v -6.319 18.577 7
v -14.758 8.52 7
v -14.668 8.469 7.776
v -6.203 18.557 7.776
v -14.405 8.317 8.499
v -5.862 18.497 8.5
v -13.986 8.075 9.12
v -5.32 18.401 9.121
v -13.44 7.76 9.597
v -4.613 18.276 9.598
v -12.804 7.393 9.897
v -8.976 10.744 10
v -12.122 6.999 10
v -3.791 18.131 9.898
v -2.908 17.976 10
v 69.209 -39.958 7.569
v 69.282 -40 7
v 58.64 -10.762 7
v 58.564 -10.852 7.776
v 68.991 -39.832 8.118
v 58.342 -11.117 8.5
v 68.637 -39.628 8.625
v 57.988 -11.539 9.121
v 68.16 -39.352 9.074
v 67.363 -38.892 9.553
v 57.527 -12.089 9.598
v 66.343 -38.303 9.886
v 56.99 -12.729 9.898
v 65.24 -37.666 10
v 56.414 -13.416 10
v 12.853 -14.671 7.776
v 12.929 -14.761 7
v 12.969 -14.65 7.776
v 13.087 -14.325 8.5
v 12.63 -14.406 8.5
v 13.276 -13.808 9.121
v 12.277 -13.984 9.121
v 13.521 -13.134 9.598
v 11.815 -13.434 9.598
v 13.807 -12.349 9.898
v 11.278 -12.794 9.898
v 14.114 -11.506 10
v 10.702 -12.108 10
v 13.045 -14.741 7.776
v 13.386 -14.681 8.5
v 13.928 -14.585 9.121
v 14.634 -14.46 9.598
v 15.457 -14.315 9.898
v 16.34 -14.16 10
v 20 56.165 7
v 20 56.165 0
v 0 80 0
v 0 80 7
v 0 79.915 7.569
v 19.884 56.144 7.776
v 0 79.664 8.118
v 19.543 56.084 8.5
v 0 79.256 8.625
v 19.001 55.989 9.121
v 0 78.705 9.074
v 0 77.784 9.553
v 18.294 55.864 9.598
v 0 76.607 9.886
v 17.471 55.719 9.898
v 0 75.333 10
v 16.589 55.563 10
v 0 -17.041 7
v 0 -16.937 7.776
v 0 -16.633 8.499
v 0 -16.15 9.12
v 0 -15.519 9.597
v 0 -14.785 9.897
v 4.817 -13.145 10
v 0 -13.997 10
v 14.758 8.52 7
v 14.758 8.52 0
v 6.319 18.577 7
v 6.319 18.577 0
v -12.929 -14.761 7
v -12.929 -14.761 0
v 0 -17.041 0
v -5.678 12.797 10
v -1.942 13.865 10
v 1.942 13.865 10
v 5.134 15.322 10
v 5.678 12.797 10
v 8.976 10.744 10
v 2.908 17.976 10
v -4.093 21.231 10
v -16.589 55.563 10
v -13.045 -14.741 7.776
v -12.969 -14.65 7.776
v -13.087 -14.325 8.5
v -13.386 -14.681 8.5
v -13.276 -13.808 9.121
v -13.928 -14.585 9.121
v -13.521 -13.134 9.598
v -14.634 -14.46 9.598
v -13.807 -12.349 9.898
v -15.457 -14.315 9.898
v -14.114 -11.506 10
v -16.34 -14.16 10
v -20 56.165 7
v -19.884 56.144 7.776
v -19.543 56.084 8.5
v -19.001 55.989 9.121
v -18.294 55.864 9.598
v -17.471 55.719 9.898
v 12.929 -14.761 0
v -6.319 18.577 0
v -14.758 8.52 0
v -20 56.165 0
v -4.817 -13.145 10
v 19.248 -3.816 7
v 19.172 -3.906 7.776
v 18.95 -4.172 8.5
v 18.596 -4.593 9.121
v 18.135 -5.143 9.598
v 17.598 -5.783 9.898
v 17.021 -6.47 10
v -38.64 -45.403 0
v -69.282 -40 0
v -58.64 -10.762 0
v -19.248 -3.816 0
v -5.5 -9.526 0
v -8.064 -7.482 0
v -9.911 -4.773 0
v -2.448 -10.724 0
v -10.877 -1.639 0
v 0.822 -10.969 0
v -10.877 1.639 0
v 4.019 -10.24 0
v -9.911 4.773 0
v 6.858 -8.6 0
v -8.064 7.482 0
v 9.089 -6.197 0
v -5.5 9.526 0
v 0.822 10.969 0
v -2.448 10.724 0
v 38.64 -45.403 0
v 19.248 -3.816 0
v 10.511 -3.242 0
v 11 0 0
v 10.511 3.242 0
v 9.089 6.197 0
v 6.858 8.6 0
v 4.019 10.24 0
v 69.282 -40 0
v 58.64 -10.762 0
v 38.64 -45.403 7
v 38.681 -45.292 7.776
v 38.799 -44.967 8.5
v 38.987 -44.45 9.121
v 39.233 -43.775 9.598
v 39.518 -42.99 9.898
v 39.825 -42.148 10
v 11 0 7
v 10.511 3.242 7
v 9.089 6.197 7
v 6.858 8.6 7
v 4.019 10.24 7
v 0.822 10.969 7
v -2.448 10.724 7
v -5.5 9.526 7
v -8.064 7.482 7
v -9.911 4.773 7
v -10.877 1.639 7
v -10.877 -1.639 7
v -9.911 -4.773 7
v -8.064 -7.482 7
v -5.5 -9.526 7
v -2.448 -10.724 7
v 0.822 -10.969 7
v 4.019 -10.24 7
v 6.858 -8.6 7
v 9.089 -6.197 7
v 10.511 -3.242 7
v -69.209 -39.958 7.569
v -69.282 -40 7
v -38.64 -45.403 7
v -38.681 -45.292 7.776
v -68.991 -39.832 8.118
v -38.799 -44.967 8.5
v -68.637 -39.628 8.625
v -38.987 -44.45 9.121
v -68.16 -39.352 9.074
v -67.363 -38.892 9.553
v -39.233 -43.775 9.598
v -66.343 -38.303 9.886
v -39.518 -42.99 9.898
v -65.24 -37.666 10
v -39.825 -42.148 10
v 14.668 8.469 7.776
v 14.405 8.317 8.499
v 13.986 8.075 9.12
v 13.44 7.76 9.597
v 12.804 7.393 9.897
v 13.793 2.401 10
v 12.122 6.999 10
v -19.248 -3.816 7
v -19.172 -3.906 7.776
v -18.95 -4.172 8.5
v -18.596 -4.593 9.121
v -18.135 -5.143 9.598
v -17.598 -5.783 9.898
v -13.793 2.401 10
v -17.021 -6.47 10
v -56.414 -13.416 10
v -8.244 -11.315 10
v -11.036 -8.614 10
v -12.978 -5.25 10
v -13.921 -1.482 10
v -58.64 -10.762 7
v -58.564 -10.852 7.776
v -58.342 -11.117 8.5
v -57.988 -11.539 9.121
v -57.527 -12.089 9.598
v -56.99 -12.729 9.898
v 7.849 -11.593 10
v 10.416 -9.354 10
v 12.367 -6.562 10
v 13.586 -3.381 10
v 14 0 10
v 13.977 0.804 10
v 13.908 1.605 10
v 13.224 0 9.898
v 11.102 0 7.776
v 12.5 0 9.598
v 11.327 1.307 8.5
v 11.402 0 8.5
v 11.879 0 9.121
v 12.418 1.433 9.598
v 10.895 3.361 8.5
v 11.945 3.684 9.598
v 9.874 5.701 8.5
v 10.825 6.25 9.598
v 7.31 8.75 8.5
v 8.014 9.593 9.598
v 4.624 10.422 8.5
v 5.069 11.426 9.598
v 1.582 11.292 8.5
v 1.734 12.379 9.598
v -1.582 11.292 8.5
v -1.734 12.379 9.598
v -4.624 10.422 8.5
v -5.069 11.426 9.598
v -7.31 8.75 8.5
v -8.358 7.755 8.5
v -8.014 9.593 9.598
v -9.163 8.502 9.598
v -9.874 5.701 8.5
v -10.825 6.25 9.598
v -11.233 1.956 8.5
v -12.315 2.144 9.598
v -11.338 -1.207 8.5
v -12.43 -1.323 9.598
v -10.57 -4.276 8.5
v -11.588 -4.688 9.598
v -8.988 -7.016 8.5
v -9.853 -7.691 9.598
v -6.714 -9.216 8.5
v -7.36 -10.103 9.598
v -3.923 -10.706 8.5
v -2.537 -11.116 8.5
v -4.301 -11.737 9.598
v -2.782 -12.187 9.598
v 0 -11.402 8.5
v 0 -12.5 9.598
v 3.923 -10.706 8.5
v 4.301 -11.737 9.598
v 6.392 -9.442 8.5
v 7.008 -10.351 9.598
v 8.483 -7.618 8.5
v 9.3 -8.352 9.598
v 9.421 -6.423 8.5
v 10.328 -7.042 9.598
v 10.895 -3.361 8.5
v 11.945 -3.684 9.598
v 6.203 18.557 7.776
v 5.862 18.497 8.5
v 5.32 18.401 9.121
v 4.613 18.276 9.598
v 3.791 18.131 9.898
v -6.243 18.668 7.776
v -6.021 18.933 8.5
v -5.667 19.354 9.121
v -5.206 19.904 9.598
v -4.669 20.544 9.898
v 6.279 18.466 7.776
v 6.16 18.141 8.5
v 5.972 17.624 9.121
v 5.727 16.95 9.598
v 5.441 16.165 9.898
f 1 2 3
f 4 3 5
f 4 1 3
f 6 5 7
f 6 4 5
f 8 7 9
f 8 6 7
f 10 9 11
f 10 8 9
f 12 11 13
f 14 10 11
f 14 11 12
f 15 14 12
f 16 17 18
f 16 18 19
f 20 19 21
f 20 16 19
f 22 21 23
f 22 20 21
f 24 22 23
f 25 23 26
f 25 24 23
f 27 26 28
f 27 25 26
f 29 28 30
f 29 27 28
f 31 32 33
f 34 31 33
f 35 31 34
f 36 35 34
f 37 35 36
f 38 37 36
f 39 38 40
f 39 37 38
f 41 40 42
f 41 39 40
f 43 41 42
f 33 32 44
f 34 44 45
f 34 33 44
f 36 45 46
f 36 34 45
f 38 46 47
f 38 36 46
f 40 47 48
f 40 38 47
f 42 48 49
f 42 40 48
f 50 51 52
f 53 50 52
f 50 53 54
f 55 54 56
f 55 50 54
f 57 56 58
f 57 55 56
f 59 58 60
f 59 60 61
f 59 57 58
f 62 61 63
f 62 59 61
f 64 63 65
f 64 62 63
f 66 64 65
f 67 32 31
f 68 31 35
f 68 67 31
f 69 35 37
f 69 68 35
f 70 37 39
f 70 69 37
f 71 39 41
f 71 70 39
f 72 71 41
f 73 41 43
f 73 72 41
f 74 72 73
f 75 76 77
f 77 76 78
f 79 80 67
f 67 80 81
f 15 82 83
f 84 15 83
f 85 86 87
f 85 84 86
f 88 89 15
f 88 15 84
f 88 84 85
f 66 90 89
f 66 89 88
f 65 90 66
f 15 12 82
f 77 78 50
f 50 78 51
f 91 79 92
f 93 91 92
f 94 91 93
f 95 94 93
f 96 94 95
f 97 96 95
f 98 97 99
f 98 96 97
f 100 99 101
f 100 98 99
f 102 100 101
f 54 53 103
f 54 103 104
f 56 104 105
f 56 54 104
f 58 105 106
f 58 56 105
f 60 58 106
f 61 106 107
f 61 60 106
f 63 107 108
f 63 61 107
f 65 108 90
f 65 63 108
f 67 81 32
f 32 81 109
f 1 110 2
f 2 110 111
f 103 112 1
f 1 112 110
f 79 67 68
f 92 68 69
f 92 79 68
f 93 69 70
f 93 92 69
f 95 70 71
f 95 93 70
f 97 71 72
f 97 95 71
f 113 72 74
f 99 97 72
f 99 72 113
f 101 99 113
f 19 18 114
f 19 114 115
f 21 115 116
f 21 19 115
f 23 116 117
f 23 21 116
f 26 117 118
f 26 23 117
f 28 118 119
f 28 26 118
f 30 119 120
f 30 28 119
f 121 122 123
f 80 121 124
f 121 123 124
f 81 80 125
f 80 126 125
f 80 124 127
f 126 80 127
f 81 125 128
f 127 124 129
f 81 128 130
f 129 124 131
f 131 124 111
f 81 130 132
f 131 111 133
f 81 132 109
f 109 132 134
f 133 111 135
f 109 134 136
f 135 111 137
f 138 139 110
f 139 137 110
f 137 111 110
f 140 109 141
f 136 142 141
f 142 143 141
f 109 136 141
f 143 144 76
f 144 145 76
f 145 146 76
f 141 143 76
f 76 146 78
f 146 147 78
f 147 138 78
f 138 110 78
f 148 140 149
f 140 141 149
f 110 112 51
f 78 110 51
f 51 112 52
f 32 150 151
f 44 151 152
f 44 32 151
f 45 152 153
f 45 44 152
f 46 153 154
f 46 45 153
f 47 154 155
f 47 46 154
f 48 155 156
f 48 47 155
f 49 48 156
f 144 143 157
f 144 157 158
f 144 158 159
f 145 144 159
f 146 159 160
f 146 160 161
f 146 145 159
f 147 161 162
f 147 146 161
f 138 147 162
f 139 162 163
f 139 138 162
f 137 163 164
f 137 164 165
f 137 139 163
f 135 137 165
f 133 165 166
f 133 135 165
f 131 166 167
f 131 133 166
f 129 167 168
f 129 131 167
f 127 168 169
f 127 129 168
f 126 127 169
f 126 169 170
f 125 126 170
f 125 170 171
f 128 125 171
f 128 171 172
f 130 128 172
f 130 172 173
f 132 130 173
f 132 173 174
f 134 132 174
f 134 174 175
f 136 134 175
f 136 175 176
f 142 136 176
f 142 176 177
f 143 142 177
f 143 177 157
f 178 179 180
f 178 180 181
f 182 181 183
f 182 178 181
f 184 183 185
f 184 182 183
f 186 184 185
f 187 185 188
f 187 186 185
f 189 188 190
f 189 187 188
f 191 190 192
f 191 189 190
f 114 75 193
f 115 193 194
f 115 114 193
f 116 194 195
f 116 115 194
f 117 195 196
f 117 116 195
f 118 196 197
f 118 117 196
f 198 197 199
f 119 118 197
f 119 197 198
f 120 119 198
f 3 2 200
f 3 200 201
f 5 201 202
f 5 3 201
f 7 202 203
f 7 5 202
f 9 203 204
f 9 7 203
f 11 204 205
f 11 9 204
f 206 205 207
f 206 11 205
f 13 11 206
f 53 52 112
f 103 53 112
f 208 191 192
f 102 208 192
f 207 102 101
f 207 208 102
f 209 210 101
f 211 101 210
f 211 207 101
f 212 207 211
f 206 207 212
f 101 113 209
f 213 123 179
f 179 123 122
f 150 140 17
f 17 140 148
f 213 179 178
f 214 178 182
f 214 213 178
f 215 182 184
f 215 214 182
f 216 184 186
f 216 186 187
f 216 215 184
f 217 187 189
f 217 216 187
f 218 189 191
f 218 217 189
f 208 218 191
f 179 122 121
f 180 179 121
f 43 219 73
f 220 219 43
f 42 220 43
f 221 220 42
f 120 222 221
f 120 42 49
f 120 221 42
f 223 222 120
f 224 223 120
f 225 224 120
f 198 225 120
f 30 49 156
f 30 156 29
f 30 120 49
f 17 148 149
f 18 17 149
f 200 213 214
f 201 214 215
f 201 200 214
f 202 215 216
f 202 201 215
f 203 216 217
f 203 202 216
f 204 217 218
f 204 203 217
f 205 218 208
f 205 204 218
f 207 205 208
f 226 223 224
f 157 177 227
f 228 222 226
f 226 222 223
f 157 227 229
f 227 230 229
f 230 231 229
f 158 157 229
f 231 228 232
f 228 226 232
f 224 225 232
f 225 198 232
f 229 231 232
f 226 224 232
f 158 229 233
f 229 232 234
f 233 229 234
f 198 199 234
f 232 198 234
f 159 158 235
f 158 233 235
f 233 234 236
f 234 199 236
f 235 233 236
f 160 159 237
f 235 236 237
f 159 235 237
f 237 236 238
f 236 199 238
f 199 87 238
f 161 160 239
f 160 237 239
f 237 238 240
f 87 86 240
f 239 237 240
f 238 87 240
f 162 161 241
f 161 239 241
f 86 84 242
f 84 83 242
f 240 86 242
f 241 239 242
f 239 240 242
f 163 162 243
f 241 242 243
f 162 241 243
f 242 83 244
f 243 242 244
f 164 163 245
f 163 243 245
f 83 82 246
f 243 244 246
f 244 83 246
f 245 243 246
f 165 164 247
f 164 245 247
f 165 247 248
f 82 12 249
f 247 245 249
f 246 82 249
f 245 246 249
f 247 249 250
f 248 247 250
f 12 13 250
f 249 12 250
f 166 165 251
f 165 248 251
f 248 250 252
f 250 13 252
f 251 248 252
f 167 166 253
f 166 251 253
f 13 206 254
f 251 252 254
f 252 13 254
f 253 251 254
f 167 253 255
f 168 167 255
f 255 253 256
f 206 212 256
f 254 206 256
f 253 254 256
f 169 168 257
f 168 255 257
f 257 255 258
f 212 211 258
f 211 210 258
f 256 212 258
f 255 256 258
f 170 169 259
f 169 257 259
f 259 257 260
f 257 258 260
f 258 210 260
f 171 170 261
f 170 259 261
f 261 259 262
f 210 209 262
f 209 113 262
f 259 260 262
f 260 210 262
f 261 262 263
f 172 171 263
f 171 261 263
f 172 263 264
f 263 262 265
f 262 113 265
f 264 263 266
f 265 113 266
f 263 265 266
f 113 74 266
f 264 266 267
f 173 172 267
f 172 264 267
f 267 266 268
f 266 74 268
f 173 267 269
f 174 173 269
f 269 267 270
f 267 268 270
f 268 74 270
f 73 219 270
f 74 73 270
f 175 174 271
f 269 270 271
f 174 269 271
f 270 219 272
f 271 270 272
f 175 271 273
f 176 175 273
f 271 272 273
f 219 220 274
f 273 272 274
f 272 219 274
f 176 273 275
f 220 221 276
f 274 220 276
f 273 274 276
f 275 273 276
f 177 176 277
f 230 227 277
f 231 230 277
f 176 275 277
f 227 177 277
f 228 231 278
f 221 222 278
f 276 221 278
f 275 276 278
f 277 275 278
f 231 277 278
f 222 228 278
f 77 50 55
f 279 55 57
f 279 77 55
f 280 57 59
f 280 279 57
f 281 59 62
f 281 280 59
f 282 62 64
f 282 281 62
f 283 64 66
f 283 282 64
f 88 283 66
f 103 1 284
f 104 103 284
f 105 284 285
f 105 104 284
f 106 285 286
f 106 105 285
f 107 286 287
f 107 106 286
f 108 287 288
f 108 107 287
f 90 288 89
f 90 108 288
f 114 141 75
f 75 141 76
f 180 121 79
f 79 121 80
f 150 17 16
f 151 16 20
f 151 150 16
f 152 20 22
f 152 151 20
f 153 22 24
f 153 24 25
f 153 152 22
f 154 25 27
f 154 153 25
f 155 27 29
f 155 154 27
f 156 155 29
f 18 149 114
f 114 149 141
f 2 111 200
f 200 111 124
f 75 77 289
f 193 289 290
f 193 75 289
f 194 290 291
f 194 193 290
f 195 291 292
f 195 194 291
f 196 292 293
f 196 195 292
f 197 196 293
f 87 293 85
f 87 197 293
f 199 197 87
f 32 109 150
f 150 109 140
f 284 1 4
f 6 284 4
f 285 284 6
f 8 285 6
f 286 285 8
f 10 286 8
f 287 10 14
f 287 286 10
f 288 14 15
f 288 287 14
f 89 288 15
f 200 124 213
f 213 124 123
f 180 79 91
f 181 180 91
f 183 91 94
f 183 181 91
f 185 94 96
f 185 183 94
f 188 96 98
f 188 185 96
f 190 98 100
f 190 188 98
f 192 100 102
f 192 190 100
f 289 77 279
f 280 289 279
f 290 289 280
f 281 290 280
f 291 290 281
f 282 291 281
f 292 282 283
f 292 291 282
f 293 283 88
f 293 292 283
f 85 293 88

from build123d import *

# Parameters (mm, degrees)
F0_R          = 11
F1_DEPTH      = 10
F2_T1_DEPTH   = 46.1144765372
F2_T3_DEPTH   = 46.1144765372
F2_T5_DEPTH   = 46.1144765372
F2_T7_DEPTH   = 46.1144765372
F2_T9_DEPTH   = 46.1144765372
F2_T11_DEPTH  = 46.1144765372
F2_T16_DEPTH  = 33.3781970019
F2_T21_DEPTH  = 33.3781970019
F2_T26_DEPTH  = 55
F2_T31_DEPTH  = 55
F2_T36_DEPTH  = 33.3781970019
F2_T41_DEPTH  = 33.3781970019
F2_T46_DEPTH  = 55
F2_T51_DEPTH  = 55
F2_T56_DEPTH  = 33.3781970019
F2_T61_DEPTH  = 33.3781970019
F2_T66_DEPTH  = 55
F2_T71_DEPTH  = 55
F2_T79_DEPTH  = 33.3781970019
F2_T83_DEPTH  = 55
F2_T90_DEPTH  = 33.3781970019
F2_T94_DEPTH  = 55
F2_T101_DEPTH = 55
F2_T105_DEPTH = 33.3781970019
F2_T112_DEPTH = 33.3781970019
F2_T116_DEPTH = 55
F2_T123_DEPTH = 55
F2_T127_DEPTH = 33.3781970019
F2_T134_DEPTH = 33.3781970019
F2_T138_DEPTH = 55


# Not quite as in the source:
# - a fillet or chamfer that OpenCascade refuses, or shapes differently, is made with other operations: its cross-section is extruded or revolved along the edge and cut away or added


with BuildPart() as f1:
    # F0 (on Top) → F1 (new body)
    with BuildSketch(Plane.XY):
        Polygon((20, 56.1649281481), (0, 80), (-20, 56.1649281481), (-6.319194267, 18.5772233167), (-14.7578366373, 8.5204409552), (-19.2479444575, -3.8160288917), (-58.640254578, -10.7619559984), (-69.2820323028, -40), (-38.640254578, -45.4029721497), (-12.9287501905, -14.761194425), (0, -17.0408819104), (12.9287501905, -14.761194425), (38.640254578, -45.4029721497), (69.2820323028, -40), (58.640254578, -10.7619559984), (19.2479444575, -3.8160288917), (14.7578366373, 8.5204409552), (6.319194267, 18.5772233167), align=None)
        Circle(F0_R, mode=Mode.SUBTRACT)
    extrude(amount=F1_DEPTH)

    # F2: fillet of radius 3 on 19 edges, made by hand

    # F2_s2 → F2_t1 (cut)
    with BuildSketch(Plane(origin=(-14.5714030478, 17.3655219314, 0), x_dir=(0, 0, 1), z_dir=(-0.6427876097, 0.7660444431, 0))):
        with BuildLine():
            ThreePointArc((7, 51.4230087749), (9.1213203436, 50.5443291185), (10, 48.4230087749))
            Line((10, 48.4230087749), (10, 51.4230087749))
            Line((10, 51.4230087749), (7, 51.4230087749))
        make_face()
    extrude(amount=F2_T1_DEPTH, mode=Mode.SUBTRACT)

    # F2_s4 → F2_t3 (cut)
    with BuildSketch(Plane(origin=(44.2132171931, 52.6912604301, 0), x_dir=(0, 0, 1), z_dir=(-0.6427876097, -0.7660444431, 0))):
        with BuildLine():
            ThreePointArc((7, 51.4230087749), (9.1213203436, 50.5443291185), (10, 48.4230087749))
            Line((10, 48.4230087749), (10, 51.4230087749))
            Line((10, 51.4230087749), (7, 51.4230087749))
        make_face()
    extrude(amount=F2_T3_DEPTH, mode=Mode.SUBTRACT)

    # F2_s6 → F2_t5 (cut)
    with BuildSketch(Plane(origin=(-7.7532816186, -21.3019661739, 0), x_dir=(0, 0, 1), z_dir=(-0.3420201433, -0.9396926208, 0))):
        with BuildLine():
            ThreePointArc((7, 51.4230087749), (9.1213203436, 50.5443291185), (10, 48.4230087749))
            Line((10, 48.4230087749), (10, 51.4230087749))
            Line((10, 51.4230087749), (7, 51.4230087749))
        make_face()
    extrude(amount=F2_T5_DEPTH, mode=Mode.SUBTRACT)

    # F2_s8 → F2_t7 (cut)
    with BuildSketch(Plane(origin=(-67.7385786864, 11.9441390573, 0), x_dir=(0, 0, 1), z_dir=(0.984807753, -0.1736481777, 0))):
        with BuildLine():
            ThreePointArc((7, 51.4230087749), (9.1213203436, 50.5443291185), (10, 48.4230087749))
            Line((10, 48.4230087749), (10, 51.4230087749))
            Line((10, 51.4230087749), (7, 51.4230087749))
        make_face()
    extrude(amount=F2_T7_DEPTH, mode=Mode.SUBTRACT)

    # F2_s10 → F2_t9 (cut)
    with BuildSketch(Plane(origin=(22.3246846665, 3.9364442425, 0), x_dir=(0, 0, 1), z_dir=(0.984807753, 0.1736481777, 0))):
        with BuildLine():
            ThreePointArc((7, 51.4230087749), (9.1213203436, 50.5443291185), (10, 48.4230087749))
            Line((10, 48.4230087749), (10, 51.4230087749))
            Line((10, 51.4230087749), (7, 51.4230087749))
        make_face()
    extrude(amount=F2_T9_DEPTH, mode=Mode.SUBTRACT)

    # F2_s12 → F2_t11 (cut)
    with BuildSketch(Plane(origin=(23.5253614933, -64.6353994873, 0), x_dir=(0, 0, 1), z_dir=(-0.3420201433, 0.9396926208, 0))):
        with BuildLine():
            ThreePointArc((7, 51.4230087749), (9.1213203436, 50.5443291185), (10, 48.4230087749))
            Line((10, 48.4230087749), (10, 51.4230087749))
            Line((10, 51.4230087749), (7, 51.4230087749))
        make_face()
    extrude(amount=F2_T11_DEPTH, mode=Mode.SUBTRACT)


with BuildPart() as f2_tool14:
    # F2_s15 → F2_t16 (new body)
    with BuildSketch(Plane(origin=(6.043180902, -16.60350307, 0), x_dir=(0, 0, 1), z_dir=(-0.3420201433, 0.9396926208, 0))):
        with BuildLine():
            ThreePointArc((7, 16.7819926235), (9.1213203436, 15.9033129671), (10, 13.7819926235))
            Line((10, 13.7819926235), (10, 16.7819926235))
            Line((10, 16.7819926235), (7, 16.7819926235))
        make_face()
    extrude(amount=F2_T16_DEPTH)

    split(bisect_by=Plane(origin=(-0.0721828315, -0.4093691799, 0), x_dir=(0, 0, 1), z_dir=(0.1736481777, 0.984807753, 0)), keep=Keep.TOP)


with BuildPart() as f1_1:
    add(f1.part)

    # F2_t13: cut F2_tool14
    add(f2_tool14.part, mode=Mode.SUBTRACT)


with BuildPart() as f2_tool19:
    # F2_s20 → F2_t21 (new body)
    with BuildSketch(Plane(origin=(10.0976264671, -12.0338826188, 0), x_dir=(0, 0, 1), z_dir=(-0.6427876097, 0.7660444431, 0))):
        with BuildLine():
            ThreePointArc((7, 16.7819926235), (9.1213203436, 15.9033129671), (10, 13.7819926235))
            Line((10, 13.7819926235), (10, 16.7819926235))
            Line((10, 16.7819926235), (7, 16.7819926235))
        make_face()
    extrude(amount=F2_T21_DEPTH)

    split(bisect_by=Plane(origin=(-0.3906155251, 0.1421724242, 0), x_dir=(0, 0, 1), z_dir=(0.9396926208, -0.3420201433, 0)), keep=Keep.TOP)


with BuildPart() as f1_2:
    add(f1_1.part)

    # F2_t18: cut F2_tool19
    add(f2_tool19.part, mode=Mode.SUBTRACT)


with BuildPart() as f2_tool24:
    # F2_s25 → F2_t26 (new body)
    with BuildSketch(Plane(origin=(4.1446587171, 11.3873562366, 0), x_dir=(0, 0, 1), z_dir=(0.3420201433, 0.9396926208, 0))):
        with BuildLine():
            ThreePointArc((7, -0.4156843594), (9.1213203436, -1.2943640158), (10, -3.4156843594))
            Line((10, -3.4156843594), (10, -0.4156843594))
            Line((10, -0.4156843594), (7, -0.4156843594))
        make_face()
    extrude(amount=F2_T26_DEPTH)

    split(bisect_by=Plane(origin=(12.8557521937, 10.7872569243, 0), x_dir=(0, 0, 1), z_dir=(0.7660444431, 0.6427876097, 0)), keep=Keep.TOP)


with BuildPart() as f1_3:
    add(f1_2.part)

    # F2_t23: cut F2_tool24
    add(f2_tool24.part, mode=Mode.SUBTRACT)


with BuildPart() as f2_tool29:
    # F2_s30 → F2_t31 (new body)
    with BuildSketch(Plane(origin=(-22.9557666, 63.0704503798, 0), x_dir=(0, 0, 1), z_dir=(0.3420201433, -0.9396926208, 0))):
        with BuildLine():
            ThreePointArc((7, -0.4156843594), (9.1213203436, -1.2943640158), (10, -3.4156843594))
            Line((10, -3.4156843594), (10, -0.4156843594))
            Line((10, -0.4156843594), (7, -0.4156843594))
        make_face()
    extrude(amount=F2_T31_DEPTH)

    split(bisect_by=Plane(origin=(-12.8557521937, 10.7872569243, 0), x_dir=(0, 0, 1), z_dir=(-0.7660444431, 0.6427876097, 0)), keep=Keep.TOP)


with BuildPart() as f1_4:
    add(f1_3.part)

    # F2_t28: cut F2_tool29
    add(f2_tool29.part, mode=Mode.SUBTRACT)


with BuildPart() as f2_tool34:
    # F2_s35 → F2_t36 (new body)
    with BuildSketch(Plane(origin=(11.3574649994, 13.5352997158, 0), x_dir=(0, 0, 1), z_dir=(-0.6427876097, -0.7660444431, 0))):
        with BuildLine():
            ThreePointArc((7, 16.7819926235), (9.1213203436, 15.9033129671), (10, 13.7819926235))
            Line((10, 13.7819926235), (10, 16.7819926235))
            Line((10, 16.7819926235), (7, 16.7819926235))
        make_face()
    extrude(amount=F2_T36_DEPTH)

    split(bisect_by=Plane(origin=(0.3906155251, 0.1421724242, 0), x_dir=(0, 0, 1), z_dir=(-0.9396926208, -0.3420201433, 0)), keep=Keep.TOP)


with BuildPart() as f1_5:
    add(f1_4.part)

    # F2_t33: cut F2_tool34
    add(f2_tool34.part, mode=Mode.SUBTRACT)


with BuildPart() as f2_tool39:
    # F2_s40 → F2_t41 (new body)
    with BuildSketch(Plane(origin=(5.3728348205, 14.7617423478, 0), x_dir=(0, 0, 1), z_dir=(-0.3420201433, -0.9396926208, 0))):
        with BuildLine():
            ThreePointArc((7, 16.7819926235), (9.1213203436, 15.9033129671), (10, 13.7819926235))
            Line((10, 13.7819926235), (10, 16.7819926235))
            Line((10, 16.7819926235), (7, 16.7819926235))
        make_face()
    extrude(amount=F2_T41_DEPTH)

    split(bisect_by=Plane(origin=(0.0721828315, -0.4093691799, 0), x_dir=(0, 0, 1), z_dir=(-0.1736481777, 0.984807753, 0)), keep=Keep.TOP)


with BuildPart() as f1_6:
    add(f1_5.part)

    # F2_t38: cut F2_tool39
    add(f2_tool39.part, mode=Mode.SUBTRACT)


with BuildPart() as f2_tool44:
    # F2_s45 → F2_t46 (new body)
    with BuildSketch(Plane(origin=(-11.9340691414, -2.1042983793, 0), x_dir=(0, 0, 1), z_dir=(-0.984807753, -0.1736481777, 0))):
        with BuildLine():
            ThreePointArc((7, -0.4156843594), (9.1213203436, -1.2943640158), (10, -3.4156843594))
            Line((10, -3.4156843594), (10, -0.4156843594))
            Line((10, -0.4156843594), (7, -0.4156843594))
        make_face()
    extrude(amount=F2_T46_DEPTH)

    split(bisect_by=Plane(origin=(-15.7699146304, 5.7397795224, 0), x_dir=(0, 0, 1), z_dir=(-0.9396926208, 0.3420201433, 0)), keep=Keep.TOP)


with BuildPart() as f1_7:
    add(f1_6.part)

    # F2_t43: cut F2_tool44
    add(f2_tool44.part, mode=Mode.SUBTRACT)


with BuildPart() as f2_tool49:
    # F2_s50 → F2_t51 (new body)
    with BuildSketch(Plane(origin=(-43.1427289571, -51.4155022289, 0), x_dir=(0, 0, 1), z_dir=(0.6427876097, 0.7660444431, 0))):
        with BuildLine():
            ThreePointArc((7, -0.4156843594), (9.1213203436, -1.2943640158), (10, -3.4156843594))
            Line((10, -3.4156843594), (10, -0.4156843594))
            Line((10, -0.4156843594), (7, -0.4156843594))
        make_face()
    extrude(amount=F2_T51_DEPTH)

    split(bisect_by=Plane(origin=(-2.9141624367, -16.5270364467, 0), x_dir=(0, 0, 1), z_dir=(-0.1736481777, -0.984807753, 0)), keep=Keep.TOP)


with BuildPart() as f1_8:
    add(f1_7.part)

    # F2_t48: cut F2_tool49
    add(f2_tool49.part, mode=Mode.SUBTRACT)


with BuildPart() as f2_tool54:
    # F2_s55 → F2_t56 (new body)
    with BuildSketch(Plane(origin=(-17.4006459014, 3.0682033542, 0), x_dir=(0, 0, 1), z_dir=(0.984807753, -0.1736481777, 0))):
        with BuildLine():
            ThreePointArc((7, 16.7819926235), (9.1213203436, 15.9033129671), (10, 13.7819926235))
            Line((10, 13.7819926235), (10, 16.7819926235))
            Line((10, 16.7819926235), (7, 16.7819926235))
        make_face()
    extrude(amount=F2_T56_DEPTH)

    split(bisect_by=Plane(origin=(-0.3184326936, 0.2671967557, 0), x_dir=(0, 0, 1), z_dir=(0.7660444431, -0.6427876097, 0)), keep=Keep.TOP)


with BuildPart() as f1_9:
    add(f1_8.part)

    # F2_t53: cut F2_tool54
    add(f2_tool54.part, mode=Mode.SUBTRACT)


with BuildPart() as f2_tool59:
    # F2_s60 → F2_t61 (new body)
    with BuildSketch(Plane(origin=(-15.4704612876, -2.727859729, 0), x_dir=(0, 0, 1), z_dir=(0.984807753, 0.1736481777, 0))):
        with BuildLine():
            ThreePointArc((7, 16.7819926235), (9.1213203436, 15.9033129671), (10, 13.7819926235))
            Line((10, 13.7819926235), (10, 16.7819926235))
            Line((10, 16.7819926235), (7, 16.7819926235))
        make_face()
    extrude(amount=F2_T61_DEPTH)

    split(bisect_by=Plane(origin=(0.3184326936, 0.2671967557, 0), x_dir=(0, 0, 1), z_dir=(-0.7660444431, -0.6427876097, 0)), keep=Keep.TOP)


with BuildPart() as f1_10:
    add(f1_9.part)

    # F2_t58: cut F2_tool59
    add(f2_tool59.part, mode=Mode.SUBTRACT)


with BuildPart() as f2_tool64:
    # F2_s65 → F2_t66 (new body)
    with BuildSketch(Plane(origin=(7.7894104243, -9.2830578573, 0), x_dir=(0, 0, 1), z_dir=(0.6427876097, -0.7660444431, 0))):
        with BuildLine():
            ThreePointArc((7, -0.4156843594), (9.1213203436, -1.2943640158), (10, -3.4156843594))
            Line((10, -3.4156843594), (10, -0.4156843594))
            Line((10, -0.4156843594), (7, -0.4156843594))
        make_face()
    extrude(amount=F2_T66_DEPTH)

    split(bisect_by=Plane(origin=(2.9141624367, -16.5270364467, 0), x_dir=(0, 0, 1), z_dir=(0.1736481777, -0.984807753, 0)), keep=Keep.TOP)


with BuildPart() as f1_11:
    add(f1_10.part)

    # F2_t63: cut F2_tool64
    add(f2_tool64.part, mode=Mode.SUBTRACT)


with BuildPart() as f2_tool69:
    # F2_s70 → F2_t71 (new body)
    with BuildSketch(Plane(origin=(66.0984955571, -11.654948151, 0), x_dir=(0, 0, 1), z_dir=(-0.984807753, 0.1736481777, 0))):
        with BuildLine():
            ThreePointArc((7, -0.4156843594), (9.1213203436, -1.2943640158), (10, -3.4156843594))
            Line((10, -3.4156843594), (10, -0.4156843594))
            Line((10, -0.4156843594), (7, -0.4156843594))
        make_face()
    extrude(amount=F2_T71_DEPTH)

    split(bisect_by=Plane(origin=(15.7699146304, 5.7397795224, 0), x_dir=(0, 0, 1), z_dir=(0.9396926208, 0.3420201433, 0)), keep=Keep.TOP)


with BuildPart() as f1_12:
    add(f1_11.part)

    # F2_t68: cut F2_tool69
    add(f2_tool69.part, mode=Mode.SUBTRACT)

    # F2_s73 → F2_t74 (revolve, cut)
    with BuildSketch(Plane.XZ):
        with BuildLine():
            ThreePointArc((11, 7), (11.8786796564, 9.1213203436), (14, 10))
            Line((14, 10), (11, 10))
            Line((11, 10), (11, 7))
        make_face()
    revolve(axis=Axis((0, 0, 10), (0, 0, 1)), mode=Mode.SUBTRACT)


with BuildPart() as f2_tool77:
    # F2_s78 → F2_t79 (new body)
    with BuildSketch(Plane(origin=(6.043180902, -16.60350307, 0), x_dir=(0, 0, 1), z_dir=(-0.3420201433, 0.9396926208, 0))):
        with BuildLine():
            ThreePointArc((7, 16.7819926235), (9.1213203436, 15.9033129671), (10, 13.7819926235))
            Line((10, 13.7819926235), (10, 16.7819926235))
            Line((10, 16.7819926235), (7, 16.7819926235))
        make_face()
    extrude(amount=F2_T79_DEPTH)

    split(bisect_by=Plane(origin=(-0.0721828315, -0.4093691799, 0), x_dir=(0, 0, 1), z_dir=(-0.1736481777, -0.984807753, 0)), keep=Keep.TOP)


with BuildPart() as f2_tool81:
    # F2_s82 → F2_t83 (new body)
    with BuildSketch(Plane(origin=(66.0984955571, -11.654948151, 0), x_dir=(0, 0, 1), z_dir=(-0.984807753, 0.1736481777, 0))):
        with BuildLine():
            ThreePointArc((7, -0.4156843594), (9.1213203436, -1.2943640158), (10, -3.4156843594))
            Line((10, -3.4156843594), (10, -0.4156843594))
            Line((10, -0.4156843594), (7, -0.4156843594))
        make_face()
    extrude(amount=F2_T83_DEPTH)

    split(bisect_by=Plane(origin=(15.7699146304, 5.7397795224, 0), x_dir=(0, 0, 1), z_dir=(-0.9396926208, -0.3420201433, 0)), keep=Keep.TOP)


with BuildPart() as f2_tool77_1:
    add(f2_tool77.part)

    # F2_t85: intersect F2_tool81
    add(f2_tool81.part, mode=Mode.INTERSECT)


with BuildPart() as f1_13:
    add(f1_12.part)

    # F2_t75: cut F2_tool77
    add(f2_tool77_1.part, mode=Mode.SUBTRACT)


with BuildPart() as f2_tool88:
    # F2_s89 → F2_t90 (new body)
    with BuildSketch(Plane(origin=(10.0976264671, -12.0338826188, 0), x_dir=(0, 0, 1), z_dir=(-0.6427876097, 0.7660444431, 0))):
        with BuildLine():
            ThreePointArc((7, 16.7819926235), (9.1213203436, 15.9033129671), (10, 13.7819926235))
            Line((10, 13.7819926235), (10, 16.7819926235))
            Line((10, 16.7819926235), (7, 16.7819926235))
        make_face()
    extrude(amount=F2_T90_DEPTH)

    split(bisect_by=Plane(origin=(-0.3906155251, 0.1421724242, 0), x_dir=(0, 0, 1), z_dir=(-0.9396926208, 0.3420201433, 0)), keep=Keep.TOP)


with BuildPart() as f2_tool92:
    # F2_s93 → F2_t94 (new body)
    with BuildSketch(Plane(origin=(4.1446587171, 11.3873562366, 0), x_dir=(0, 0, 1), z_dir=(0.3420201433, 0.9396926208, 0))):
        with BuildLine():
            ThreePointArc((7, -0.4156843594), (9.1213203436, -1.2943640158), (10, -3.4156843594))
            Line((10, -3.4156843594), (10, -0.4156843594))
            Line((10, -0.4156843594), (7, -0.4156843594))
        make_face()
    extrude(amount=F2_T94_DEPTH)

    split(bisect_by=Plane(origin=(12.8557521937, 10.7872569243, 0), x_dir=(0, 0, 1), z_dir=(-0.7660444431, -0.6427876097, 0)), keep=Keep.TOP)


with BuildPart() as f2_tool88_1:
    add(f2_tool88.part)

    # F2_t96: intersect F2_tool92
    add(f2_tool92.part, mode=Mode.INTERSECT)


with BuildPart() as f1_14:
    add(f1_13.part)

    # F2_t86: cut F2_tool88
    add(f2_tool88_1.part, mode=Mode.SUBTRACT)


with BuildPart() as f2_tool99:
    # F2_s100 → F2_t101 (new body)
    with BuildSketch(Plane(origin=(-22.9557666, 63.0704503798, 0), x_dir=(0, 0, 1), z_dir=(0.3420201433, -0.9396926208, 0))):
        with BuildLine():
            ThreePointArc((7, -0.4156843594), (9.1213203436, -1.2943640158), (10, -3.4156843594))
            Line((10, -3.4156843594), (10, -0.4156843594))
            Line((10, -0.4156843594), (7, -0.4156843594))
        make_face()
    extrude(amount=F2_T101_DEPTH)

    split(bisect_by=Plane(origin=(-12.8557521937, 10.7872569243, 0), x_dir=(0, 0, 1), z_dir=(0.7660444431, -0.6427876097, 0)), keep=Keep.TOP)


with BuildPart() as f2_tool103:
    # F2_s104 → F2_t105 (new body)
    with BuildSketch(Plane(origin=(11.3574649994, 13.5352997158, 0), x_dir=(0, 0, 1), z_dir=(-0.6427876097, -0.7660444431, 0))):
        with BuildLine():
            ThreePointArc((7, 16.7819926235), (9.1213203436, 15.9033129671), (10, 13.7819926235))
            Line((10, 13.7819926235), (10, 16.7819926235))
            Line((10, 16.7819926235), (7, 16.7819926235))
        make_face()
    extrude(amount=F2_T105_DEPTH)

    split(bisect_by=Plane(origin=(0.3906155251, 0.1421724242, 0), x_dir=(0, 0, 1), z_dir=(0.9396926208, 0.3420201433, 0)), keep=Keep.TOP)


with BuildPart() as f2_tool99_1:
    add(f2_tool99.part)

    # F2_t107: intersect F2_tool103
    add(f2_tool103.part, mode=Mode.INTERSECT)


with BuildPart() as f1_15:
    add(f1_14.part)

    # F2_t97: cut F2_tool99
    add(f2_tool99_1.part, mode=Mode.SUBTRACT)


with BuildPart() as f2_tool110:
    # F2_s111 → F2_t112 (new body)
    with BuildSketch(Plane(origin=(5.3728348205, 14.7617423478, 0), x_dir=(0, 0, 1), z_dir=(-0.3420201433, -0.9396926208, 0))):
        with BuildLine():
            ThreePointArc((7, 16.7819926235), (9.1213203436, 15.9033129671), (10, 13.7819926235))
            Line((10, 13.7819926235), (10, 16.7819926235))
            Line((10, 16.7819926235), (7, 16.7819926235))
        make_face()
    extrude(amount=F2_T112_DEPTH)

    split(bisect_by=Plane(origin=(0.0721828315, -0.4093691799, 0), x_dir=(0, 0, 1), z_dir=(0.1736481777, -0.984807753, 0)), keep=Keep.TOP)


with BuildPart() as f2_tool114:
    # F2_s115 → F2_t116 (new body)
    with BuildSketch(Plane(origin=(-11.9340691414, -2.1042983793, 0), x_dir=(0, 0, 1), z_dir=(-0.984807753, -0.1736481777, 0))):
        with BuildLine():
            ThreePointArc((7, -0.4156843594), (9.1213203436, -1.2943640158), (10, -3.4156843594))
            Line((10, -3.4156843594), (10, -0.4156843594))
            Line((10, -0.4156843594), (7, -0.4156843594))
        make_face()
    extrude(amount=F2_T116_DEPTH)

    split(bisect_by=Plane(origin=(-15.7699146304, 5.7397795224, 0), x_dir=(0, 0, 1), z_dir=(0.9396926208, -0.3420201433, 0)), keep=Keep.TOP)


with BuildPart() as f2_tool110_1:
    add(f2_tool110.part)

    # F2_t118: intersect F2_tool114
    add(f2_tool114.part, mode=Mode.INTERSECT)


with BuildPart() as f1_16:
    add(f1_15.part)

    # F2_t108: cut F2_tool110
    add(f2_tool110_1.part, mode=Mode.SUBTRACT)


with BuildPart() as f2_tool121:
    # F2_s122 → F2_t123 (new body)
    with BuildSketch(Plane(origin=(-43.1427289571, -51.4155022289, 0), x_dir=(0, 0, 1), z_dir=(0.6427876097, 0.7660444431, 0))):
        with BuildLine():
            ThreePointArc((7, -0.4156843594), (9.1213203436, -1.2943640158), (10, -3.4156843594))
            Line((10, -3.4156843594), (10, -0.4156843594))
            Line((10, -0.4156843594), (7, -0.4156843594))
        make_face()
    extrude(amount=F2_T123_DEPTH)

    split(bisect_by=Plane(origin=(-2.9141624367, -16.5270364467, 0), x_dir=(0, 0, 1), z_dir=(0.1736481777, 0.984807753, 0)), keep=Keep.TOP)


with BuildPart() as f2_tool125:
    # F2_s126 → F2_t127 (new body)
    with BuildSketch(Plane(origin=(-17.4006459014, 3.0682033542, 0), x_dir=(0, 0, 1), z_dir=(0.984807753, -0.1736481777, 0))):
        with BuildLine():
            ThreePointArc((7, 16.7819926235), (9.1213203436, 15.9033129671), (10, 13.7819926235))
            Line((10, 13.7819926235), (10, 16.7819926235))
            Line((10, 16.7819926235), (7, 16.7819926235))
        make_face()
    extrude(amount=F2_T127_DEPTH)

    split(bisect_by=Plane(origin=(-0.3184326936, 0.2671967557, 0), x_dir=(0, 0, 1), z_dir=(-0.7660444431, 0.6427876097, 0)), keep=Keep.TOP)


with BuildPart() as f2_tool121_1:
    add(f2_tool121.part)

    # F2_t129: intersect F2_tool125
    add(f2_tool125.part, mode=Mode.INTERSECT)


with BuildPart() as f1_17:
    add(f1_16.part)

    # F2_t119: cut F2_tool121
    add(f2_tool121_1.part, mode=Mode.SUBTRACT)


with BuildPart() as f2_tool132:
    # F2_s133 → F2_t134 (new body)
    with BuildSketch(Plane(origin=(-15.4704612876, -2.727859729, 0), x_dir=(0, 0, 1), z_dir=(0.984807753, 0.1736481777, 0))):
        with BuildLine():
            ThreePointArc((7, 16.7819926235), (9.1213203436, 15.9033129671), (10, 13.7819926235))
            Line((10, 13.7819926235), (10, 16.7819926235))
            Line((10, 16.7819926235), (7, 16.7819926235))
        make_face()
    extrude(amount=F2_T134_DEPTH)

    split(bisect_by=Plane(origin=(0.3184326936, 0.2671967557, 0), x_dir=(0, 0, 1), z_dir=(0.7660444431, 0.6427876097, 0)), keep=Keep.TOP)


with BuildPart() as f2_tool136:
    # F2_s137 → F2_t138 (new body)
    with BuildSketch(Plane(origin=(7.7894104243, -9.2830578573, 0), x_dir=(0, 0, 1), z_dir=(0.6427876097, -0.7660444431, 0))):
        with BuildLine():
            ThreePointArc((7, -0.4156843594), (9.1213203436, -1.2943640158), (10, -3.4156843594))
            Line((10, -3.4156843594), (10, -0.4156843594))
            Line((10, -0.4156843594), (7, -0.4156843594))
        make_face()
    extrude(amount=F2_T138_DEPTH)

    split(bisect_by=Plane(origin=(2.9141624367, -16.5270364467, 0), x_dir=(0, 0, 1), z_dir=(-0.1736481777, 0.984807753, 0)), keep=Keep.TOP)


with BuildPart() as f2_tool132_1:
    add(f2_tool132.part)

    # F2_t140: intersect F2_tool136
    add(f2_tool136.part, mode=Mode.INTERSECT)


with BuildPart() as f1_18:
    add(f1_17.part)

    # F2_t130: cut F2_tool132
    add(f2_tool132_1.part, mode=Mode.SUBTRACT)


solid = f1_18.part
